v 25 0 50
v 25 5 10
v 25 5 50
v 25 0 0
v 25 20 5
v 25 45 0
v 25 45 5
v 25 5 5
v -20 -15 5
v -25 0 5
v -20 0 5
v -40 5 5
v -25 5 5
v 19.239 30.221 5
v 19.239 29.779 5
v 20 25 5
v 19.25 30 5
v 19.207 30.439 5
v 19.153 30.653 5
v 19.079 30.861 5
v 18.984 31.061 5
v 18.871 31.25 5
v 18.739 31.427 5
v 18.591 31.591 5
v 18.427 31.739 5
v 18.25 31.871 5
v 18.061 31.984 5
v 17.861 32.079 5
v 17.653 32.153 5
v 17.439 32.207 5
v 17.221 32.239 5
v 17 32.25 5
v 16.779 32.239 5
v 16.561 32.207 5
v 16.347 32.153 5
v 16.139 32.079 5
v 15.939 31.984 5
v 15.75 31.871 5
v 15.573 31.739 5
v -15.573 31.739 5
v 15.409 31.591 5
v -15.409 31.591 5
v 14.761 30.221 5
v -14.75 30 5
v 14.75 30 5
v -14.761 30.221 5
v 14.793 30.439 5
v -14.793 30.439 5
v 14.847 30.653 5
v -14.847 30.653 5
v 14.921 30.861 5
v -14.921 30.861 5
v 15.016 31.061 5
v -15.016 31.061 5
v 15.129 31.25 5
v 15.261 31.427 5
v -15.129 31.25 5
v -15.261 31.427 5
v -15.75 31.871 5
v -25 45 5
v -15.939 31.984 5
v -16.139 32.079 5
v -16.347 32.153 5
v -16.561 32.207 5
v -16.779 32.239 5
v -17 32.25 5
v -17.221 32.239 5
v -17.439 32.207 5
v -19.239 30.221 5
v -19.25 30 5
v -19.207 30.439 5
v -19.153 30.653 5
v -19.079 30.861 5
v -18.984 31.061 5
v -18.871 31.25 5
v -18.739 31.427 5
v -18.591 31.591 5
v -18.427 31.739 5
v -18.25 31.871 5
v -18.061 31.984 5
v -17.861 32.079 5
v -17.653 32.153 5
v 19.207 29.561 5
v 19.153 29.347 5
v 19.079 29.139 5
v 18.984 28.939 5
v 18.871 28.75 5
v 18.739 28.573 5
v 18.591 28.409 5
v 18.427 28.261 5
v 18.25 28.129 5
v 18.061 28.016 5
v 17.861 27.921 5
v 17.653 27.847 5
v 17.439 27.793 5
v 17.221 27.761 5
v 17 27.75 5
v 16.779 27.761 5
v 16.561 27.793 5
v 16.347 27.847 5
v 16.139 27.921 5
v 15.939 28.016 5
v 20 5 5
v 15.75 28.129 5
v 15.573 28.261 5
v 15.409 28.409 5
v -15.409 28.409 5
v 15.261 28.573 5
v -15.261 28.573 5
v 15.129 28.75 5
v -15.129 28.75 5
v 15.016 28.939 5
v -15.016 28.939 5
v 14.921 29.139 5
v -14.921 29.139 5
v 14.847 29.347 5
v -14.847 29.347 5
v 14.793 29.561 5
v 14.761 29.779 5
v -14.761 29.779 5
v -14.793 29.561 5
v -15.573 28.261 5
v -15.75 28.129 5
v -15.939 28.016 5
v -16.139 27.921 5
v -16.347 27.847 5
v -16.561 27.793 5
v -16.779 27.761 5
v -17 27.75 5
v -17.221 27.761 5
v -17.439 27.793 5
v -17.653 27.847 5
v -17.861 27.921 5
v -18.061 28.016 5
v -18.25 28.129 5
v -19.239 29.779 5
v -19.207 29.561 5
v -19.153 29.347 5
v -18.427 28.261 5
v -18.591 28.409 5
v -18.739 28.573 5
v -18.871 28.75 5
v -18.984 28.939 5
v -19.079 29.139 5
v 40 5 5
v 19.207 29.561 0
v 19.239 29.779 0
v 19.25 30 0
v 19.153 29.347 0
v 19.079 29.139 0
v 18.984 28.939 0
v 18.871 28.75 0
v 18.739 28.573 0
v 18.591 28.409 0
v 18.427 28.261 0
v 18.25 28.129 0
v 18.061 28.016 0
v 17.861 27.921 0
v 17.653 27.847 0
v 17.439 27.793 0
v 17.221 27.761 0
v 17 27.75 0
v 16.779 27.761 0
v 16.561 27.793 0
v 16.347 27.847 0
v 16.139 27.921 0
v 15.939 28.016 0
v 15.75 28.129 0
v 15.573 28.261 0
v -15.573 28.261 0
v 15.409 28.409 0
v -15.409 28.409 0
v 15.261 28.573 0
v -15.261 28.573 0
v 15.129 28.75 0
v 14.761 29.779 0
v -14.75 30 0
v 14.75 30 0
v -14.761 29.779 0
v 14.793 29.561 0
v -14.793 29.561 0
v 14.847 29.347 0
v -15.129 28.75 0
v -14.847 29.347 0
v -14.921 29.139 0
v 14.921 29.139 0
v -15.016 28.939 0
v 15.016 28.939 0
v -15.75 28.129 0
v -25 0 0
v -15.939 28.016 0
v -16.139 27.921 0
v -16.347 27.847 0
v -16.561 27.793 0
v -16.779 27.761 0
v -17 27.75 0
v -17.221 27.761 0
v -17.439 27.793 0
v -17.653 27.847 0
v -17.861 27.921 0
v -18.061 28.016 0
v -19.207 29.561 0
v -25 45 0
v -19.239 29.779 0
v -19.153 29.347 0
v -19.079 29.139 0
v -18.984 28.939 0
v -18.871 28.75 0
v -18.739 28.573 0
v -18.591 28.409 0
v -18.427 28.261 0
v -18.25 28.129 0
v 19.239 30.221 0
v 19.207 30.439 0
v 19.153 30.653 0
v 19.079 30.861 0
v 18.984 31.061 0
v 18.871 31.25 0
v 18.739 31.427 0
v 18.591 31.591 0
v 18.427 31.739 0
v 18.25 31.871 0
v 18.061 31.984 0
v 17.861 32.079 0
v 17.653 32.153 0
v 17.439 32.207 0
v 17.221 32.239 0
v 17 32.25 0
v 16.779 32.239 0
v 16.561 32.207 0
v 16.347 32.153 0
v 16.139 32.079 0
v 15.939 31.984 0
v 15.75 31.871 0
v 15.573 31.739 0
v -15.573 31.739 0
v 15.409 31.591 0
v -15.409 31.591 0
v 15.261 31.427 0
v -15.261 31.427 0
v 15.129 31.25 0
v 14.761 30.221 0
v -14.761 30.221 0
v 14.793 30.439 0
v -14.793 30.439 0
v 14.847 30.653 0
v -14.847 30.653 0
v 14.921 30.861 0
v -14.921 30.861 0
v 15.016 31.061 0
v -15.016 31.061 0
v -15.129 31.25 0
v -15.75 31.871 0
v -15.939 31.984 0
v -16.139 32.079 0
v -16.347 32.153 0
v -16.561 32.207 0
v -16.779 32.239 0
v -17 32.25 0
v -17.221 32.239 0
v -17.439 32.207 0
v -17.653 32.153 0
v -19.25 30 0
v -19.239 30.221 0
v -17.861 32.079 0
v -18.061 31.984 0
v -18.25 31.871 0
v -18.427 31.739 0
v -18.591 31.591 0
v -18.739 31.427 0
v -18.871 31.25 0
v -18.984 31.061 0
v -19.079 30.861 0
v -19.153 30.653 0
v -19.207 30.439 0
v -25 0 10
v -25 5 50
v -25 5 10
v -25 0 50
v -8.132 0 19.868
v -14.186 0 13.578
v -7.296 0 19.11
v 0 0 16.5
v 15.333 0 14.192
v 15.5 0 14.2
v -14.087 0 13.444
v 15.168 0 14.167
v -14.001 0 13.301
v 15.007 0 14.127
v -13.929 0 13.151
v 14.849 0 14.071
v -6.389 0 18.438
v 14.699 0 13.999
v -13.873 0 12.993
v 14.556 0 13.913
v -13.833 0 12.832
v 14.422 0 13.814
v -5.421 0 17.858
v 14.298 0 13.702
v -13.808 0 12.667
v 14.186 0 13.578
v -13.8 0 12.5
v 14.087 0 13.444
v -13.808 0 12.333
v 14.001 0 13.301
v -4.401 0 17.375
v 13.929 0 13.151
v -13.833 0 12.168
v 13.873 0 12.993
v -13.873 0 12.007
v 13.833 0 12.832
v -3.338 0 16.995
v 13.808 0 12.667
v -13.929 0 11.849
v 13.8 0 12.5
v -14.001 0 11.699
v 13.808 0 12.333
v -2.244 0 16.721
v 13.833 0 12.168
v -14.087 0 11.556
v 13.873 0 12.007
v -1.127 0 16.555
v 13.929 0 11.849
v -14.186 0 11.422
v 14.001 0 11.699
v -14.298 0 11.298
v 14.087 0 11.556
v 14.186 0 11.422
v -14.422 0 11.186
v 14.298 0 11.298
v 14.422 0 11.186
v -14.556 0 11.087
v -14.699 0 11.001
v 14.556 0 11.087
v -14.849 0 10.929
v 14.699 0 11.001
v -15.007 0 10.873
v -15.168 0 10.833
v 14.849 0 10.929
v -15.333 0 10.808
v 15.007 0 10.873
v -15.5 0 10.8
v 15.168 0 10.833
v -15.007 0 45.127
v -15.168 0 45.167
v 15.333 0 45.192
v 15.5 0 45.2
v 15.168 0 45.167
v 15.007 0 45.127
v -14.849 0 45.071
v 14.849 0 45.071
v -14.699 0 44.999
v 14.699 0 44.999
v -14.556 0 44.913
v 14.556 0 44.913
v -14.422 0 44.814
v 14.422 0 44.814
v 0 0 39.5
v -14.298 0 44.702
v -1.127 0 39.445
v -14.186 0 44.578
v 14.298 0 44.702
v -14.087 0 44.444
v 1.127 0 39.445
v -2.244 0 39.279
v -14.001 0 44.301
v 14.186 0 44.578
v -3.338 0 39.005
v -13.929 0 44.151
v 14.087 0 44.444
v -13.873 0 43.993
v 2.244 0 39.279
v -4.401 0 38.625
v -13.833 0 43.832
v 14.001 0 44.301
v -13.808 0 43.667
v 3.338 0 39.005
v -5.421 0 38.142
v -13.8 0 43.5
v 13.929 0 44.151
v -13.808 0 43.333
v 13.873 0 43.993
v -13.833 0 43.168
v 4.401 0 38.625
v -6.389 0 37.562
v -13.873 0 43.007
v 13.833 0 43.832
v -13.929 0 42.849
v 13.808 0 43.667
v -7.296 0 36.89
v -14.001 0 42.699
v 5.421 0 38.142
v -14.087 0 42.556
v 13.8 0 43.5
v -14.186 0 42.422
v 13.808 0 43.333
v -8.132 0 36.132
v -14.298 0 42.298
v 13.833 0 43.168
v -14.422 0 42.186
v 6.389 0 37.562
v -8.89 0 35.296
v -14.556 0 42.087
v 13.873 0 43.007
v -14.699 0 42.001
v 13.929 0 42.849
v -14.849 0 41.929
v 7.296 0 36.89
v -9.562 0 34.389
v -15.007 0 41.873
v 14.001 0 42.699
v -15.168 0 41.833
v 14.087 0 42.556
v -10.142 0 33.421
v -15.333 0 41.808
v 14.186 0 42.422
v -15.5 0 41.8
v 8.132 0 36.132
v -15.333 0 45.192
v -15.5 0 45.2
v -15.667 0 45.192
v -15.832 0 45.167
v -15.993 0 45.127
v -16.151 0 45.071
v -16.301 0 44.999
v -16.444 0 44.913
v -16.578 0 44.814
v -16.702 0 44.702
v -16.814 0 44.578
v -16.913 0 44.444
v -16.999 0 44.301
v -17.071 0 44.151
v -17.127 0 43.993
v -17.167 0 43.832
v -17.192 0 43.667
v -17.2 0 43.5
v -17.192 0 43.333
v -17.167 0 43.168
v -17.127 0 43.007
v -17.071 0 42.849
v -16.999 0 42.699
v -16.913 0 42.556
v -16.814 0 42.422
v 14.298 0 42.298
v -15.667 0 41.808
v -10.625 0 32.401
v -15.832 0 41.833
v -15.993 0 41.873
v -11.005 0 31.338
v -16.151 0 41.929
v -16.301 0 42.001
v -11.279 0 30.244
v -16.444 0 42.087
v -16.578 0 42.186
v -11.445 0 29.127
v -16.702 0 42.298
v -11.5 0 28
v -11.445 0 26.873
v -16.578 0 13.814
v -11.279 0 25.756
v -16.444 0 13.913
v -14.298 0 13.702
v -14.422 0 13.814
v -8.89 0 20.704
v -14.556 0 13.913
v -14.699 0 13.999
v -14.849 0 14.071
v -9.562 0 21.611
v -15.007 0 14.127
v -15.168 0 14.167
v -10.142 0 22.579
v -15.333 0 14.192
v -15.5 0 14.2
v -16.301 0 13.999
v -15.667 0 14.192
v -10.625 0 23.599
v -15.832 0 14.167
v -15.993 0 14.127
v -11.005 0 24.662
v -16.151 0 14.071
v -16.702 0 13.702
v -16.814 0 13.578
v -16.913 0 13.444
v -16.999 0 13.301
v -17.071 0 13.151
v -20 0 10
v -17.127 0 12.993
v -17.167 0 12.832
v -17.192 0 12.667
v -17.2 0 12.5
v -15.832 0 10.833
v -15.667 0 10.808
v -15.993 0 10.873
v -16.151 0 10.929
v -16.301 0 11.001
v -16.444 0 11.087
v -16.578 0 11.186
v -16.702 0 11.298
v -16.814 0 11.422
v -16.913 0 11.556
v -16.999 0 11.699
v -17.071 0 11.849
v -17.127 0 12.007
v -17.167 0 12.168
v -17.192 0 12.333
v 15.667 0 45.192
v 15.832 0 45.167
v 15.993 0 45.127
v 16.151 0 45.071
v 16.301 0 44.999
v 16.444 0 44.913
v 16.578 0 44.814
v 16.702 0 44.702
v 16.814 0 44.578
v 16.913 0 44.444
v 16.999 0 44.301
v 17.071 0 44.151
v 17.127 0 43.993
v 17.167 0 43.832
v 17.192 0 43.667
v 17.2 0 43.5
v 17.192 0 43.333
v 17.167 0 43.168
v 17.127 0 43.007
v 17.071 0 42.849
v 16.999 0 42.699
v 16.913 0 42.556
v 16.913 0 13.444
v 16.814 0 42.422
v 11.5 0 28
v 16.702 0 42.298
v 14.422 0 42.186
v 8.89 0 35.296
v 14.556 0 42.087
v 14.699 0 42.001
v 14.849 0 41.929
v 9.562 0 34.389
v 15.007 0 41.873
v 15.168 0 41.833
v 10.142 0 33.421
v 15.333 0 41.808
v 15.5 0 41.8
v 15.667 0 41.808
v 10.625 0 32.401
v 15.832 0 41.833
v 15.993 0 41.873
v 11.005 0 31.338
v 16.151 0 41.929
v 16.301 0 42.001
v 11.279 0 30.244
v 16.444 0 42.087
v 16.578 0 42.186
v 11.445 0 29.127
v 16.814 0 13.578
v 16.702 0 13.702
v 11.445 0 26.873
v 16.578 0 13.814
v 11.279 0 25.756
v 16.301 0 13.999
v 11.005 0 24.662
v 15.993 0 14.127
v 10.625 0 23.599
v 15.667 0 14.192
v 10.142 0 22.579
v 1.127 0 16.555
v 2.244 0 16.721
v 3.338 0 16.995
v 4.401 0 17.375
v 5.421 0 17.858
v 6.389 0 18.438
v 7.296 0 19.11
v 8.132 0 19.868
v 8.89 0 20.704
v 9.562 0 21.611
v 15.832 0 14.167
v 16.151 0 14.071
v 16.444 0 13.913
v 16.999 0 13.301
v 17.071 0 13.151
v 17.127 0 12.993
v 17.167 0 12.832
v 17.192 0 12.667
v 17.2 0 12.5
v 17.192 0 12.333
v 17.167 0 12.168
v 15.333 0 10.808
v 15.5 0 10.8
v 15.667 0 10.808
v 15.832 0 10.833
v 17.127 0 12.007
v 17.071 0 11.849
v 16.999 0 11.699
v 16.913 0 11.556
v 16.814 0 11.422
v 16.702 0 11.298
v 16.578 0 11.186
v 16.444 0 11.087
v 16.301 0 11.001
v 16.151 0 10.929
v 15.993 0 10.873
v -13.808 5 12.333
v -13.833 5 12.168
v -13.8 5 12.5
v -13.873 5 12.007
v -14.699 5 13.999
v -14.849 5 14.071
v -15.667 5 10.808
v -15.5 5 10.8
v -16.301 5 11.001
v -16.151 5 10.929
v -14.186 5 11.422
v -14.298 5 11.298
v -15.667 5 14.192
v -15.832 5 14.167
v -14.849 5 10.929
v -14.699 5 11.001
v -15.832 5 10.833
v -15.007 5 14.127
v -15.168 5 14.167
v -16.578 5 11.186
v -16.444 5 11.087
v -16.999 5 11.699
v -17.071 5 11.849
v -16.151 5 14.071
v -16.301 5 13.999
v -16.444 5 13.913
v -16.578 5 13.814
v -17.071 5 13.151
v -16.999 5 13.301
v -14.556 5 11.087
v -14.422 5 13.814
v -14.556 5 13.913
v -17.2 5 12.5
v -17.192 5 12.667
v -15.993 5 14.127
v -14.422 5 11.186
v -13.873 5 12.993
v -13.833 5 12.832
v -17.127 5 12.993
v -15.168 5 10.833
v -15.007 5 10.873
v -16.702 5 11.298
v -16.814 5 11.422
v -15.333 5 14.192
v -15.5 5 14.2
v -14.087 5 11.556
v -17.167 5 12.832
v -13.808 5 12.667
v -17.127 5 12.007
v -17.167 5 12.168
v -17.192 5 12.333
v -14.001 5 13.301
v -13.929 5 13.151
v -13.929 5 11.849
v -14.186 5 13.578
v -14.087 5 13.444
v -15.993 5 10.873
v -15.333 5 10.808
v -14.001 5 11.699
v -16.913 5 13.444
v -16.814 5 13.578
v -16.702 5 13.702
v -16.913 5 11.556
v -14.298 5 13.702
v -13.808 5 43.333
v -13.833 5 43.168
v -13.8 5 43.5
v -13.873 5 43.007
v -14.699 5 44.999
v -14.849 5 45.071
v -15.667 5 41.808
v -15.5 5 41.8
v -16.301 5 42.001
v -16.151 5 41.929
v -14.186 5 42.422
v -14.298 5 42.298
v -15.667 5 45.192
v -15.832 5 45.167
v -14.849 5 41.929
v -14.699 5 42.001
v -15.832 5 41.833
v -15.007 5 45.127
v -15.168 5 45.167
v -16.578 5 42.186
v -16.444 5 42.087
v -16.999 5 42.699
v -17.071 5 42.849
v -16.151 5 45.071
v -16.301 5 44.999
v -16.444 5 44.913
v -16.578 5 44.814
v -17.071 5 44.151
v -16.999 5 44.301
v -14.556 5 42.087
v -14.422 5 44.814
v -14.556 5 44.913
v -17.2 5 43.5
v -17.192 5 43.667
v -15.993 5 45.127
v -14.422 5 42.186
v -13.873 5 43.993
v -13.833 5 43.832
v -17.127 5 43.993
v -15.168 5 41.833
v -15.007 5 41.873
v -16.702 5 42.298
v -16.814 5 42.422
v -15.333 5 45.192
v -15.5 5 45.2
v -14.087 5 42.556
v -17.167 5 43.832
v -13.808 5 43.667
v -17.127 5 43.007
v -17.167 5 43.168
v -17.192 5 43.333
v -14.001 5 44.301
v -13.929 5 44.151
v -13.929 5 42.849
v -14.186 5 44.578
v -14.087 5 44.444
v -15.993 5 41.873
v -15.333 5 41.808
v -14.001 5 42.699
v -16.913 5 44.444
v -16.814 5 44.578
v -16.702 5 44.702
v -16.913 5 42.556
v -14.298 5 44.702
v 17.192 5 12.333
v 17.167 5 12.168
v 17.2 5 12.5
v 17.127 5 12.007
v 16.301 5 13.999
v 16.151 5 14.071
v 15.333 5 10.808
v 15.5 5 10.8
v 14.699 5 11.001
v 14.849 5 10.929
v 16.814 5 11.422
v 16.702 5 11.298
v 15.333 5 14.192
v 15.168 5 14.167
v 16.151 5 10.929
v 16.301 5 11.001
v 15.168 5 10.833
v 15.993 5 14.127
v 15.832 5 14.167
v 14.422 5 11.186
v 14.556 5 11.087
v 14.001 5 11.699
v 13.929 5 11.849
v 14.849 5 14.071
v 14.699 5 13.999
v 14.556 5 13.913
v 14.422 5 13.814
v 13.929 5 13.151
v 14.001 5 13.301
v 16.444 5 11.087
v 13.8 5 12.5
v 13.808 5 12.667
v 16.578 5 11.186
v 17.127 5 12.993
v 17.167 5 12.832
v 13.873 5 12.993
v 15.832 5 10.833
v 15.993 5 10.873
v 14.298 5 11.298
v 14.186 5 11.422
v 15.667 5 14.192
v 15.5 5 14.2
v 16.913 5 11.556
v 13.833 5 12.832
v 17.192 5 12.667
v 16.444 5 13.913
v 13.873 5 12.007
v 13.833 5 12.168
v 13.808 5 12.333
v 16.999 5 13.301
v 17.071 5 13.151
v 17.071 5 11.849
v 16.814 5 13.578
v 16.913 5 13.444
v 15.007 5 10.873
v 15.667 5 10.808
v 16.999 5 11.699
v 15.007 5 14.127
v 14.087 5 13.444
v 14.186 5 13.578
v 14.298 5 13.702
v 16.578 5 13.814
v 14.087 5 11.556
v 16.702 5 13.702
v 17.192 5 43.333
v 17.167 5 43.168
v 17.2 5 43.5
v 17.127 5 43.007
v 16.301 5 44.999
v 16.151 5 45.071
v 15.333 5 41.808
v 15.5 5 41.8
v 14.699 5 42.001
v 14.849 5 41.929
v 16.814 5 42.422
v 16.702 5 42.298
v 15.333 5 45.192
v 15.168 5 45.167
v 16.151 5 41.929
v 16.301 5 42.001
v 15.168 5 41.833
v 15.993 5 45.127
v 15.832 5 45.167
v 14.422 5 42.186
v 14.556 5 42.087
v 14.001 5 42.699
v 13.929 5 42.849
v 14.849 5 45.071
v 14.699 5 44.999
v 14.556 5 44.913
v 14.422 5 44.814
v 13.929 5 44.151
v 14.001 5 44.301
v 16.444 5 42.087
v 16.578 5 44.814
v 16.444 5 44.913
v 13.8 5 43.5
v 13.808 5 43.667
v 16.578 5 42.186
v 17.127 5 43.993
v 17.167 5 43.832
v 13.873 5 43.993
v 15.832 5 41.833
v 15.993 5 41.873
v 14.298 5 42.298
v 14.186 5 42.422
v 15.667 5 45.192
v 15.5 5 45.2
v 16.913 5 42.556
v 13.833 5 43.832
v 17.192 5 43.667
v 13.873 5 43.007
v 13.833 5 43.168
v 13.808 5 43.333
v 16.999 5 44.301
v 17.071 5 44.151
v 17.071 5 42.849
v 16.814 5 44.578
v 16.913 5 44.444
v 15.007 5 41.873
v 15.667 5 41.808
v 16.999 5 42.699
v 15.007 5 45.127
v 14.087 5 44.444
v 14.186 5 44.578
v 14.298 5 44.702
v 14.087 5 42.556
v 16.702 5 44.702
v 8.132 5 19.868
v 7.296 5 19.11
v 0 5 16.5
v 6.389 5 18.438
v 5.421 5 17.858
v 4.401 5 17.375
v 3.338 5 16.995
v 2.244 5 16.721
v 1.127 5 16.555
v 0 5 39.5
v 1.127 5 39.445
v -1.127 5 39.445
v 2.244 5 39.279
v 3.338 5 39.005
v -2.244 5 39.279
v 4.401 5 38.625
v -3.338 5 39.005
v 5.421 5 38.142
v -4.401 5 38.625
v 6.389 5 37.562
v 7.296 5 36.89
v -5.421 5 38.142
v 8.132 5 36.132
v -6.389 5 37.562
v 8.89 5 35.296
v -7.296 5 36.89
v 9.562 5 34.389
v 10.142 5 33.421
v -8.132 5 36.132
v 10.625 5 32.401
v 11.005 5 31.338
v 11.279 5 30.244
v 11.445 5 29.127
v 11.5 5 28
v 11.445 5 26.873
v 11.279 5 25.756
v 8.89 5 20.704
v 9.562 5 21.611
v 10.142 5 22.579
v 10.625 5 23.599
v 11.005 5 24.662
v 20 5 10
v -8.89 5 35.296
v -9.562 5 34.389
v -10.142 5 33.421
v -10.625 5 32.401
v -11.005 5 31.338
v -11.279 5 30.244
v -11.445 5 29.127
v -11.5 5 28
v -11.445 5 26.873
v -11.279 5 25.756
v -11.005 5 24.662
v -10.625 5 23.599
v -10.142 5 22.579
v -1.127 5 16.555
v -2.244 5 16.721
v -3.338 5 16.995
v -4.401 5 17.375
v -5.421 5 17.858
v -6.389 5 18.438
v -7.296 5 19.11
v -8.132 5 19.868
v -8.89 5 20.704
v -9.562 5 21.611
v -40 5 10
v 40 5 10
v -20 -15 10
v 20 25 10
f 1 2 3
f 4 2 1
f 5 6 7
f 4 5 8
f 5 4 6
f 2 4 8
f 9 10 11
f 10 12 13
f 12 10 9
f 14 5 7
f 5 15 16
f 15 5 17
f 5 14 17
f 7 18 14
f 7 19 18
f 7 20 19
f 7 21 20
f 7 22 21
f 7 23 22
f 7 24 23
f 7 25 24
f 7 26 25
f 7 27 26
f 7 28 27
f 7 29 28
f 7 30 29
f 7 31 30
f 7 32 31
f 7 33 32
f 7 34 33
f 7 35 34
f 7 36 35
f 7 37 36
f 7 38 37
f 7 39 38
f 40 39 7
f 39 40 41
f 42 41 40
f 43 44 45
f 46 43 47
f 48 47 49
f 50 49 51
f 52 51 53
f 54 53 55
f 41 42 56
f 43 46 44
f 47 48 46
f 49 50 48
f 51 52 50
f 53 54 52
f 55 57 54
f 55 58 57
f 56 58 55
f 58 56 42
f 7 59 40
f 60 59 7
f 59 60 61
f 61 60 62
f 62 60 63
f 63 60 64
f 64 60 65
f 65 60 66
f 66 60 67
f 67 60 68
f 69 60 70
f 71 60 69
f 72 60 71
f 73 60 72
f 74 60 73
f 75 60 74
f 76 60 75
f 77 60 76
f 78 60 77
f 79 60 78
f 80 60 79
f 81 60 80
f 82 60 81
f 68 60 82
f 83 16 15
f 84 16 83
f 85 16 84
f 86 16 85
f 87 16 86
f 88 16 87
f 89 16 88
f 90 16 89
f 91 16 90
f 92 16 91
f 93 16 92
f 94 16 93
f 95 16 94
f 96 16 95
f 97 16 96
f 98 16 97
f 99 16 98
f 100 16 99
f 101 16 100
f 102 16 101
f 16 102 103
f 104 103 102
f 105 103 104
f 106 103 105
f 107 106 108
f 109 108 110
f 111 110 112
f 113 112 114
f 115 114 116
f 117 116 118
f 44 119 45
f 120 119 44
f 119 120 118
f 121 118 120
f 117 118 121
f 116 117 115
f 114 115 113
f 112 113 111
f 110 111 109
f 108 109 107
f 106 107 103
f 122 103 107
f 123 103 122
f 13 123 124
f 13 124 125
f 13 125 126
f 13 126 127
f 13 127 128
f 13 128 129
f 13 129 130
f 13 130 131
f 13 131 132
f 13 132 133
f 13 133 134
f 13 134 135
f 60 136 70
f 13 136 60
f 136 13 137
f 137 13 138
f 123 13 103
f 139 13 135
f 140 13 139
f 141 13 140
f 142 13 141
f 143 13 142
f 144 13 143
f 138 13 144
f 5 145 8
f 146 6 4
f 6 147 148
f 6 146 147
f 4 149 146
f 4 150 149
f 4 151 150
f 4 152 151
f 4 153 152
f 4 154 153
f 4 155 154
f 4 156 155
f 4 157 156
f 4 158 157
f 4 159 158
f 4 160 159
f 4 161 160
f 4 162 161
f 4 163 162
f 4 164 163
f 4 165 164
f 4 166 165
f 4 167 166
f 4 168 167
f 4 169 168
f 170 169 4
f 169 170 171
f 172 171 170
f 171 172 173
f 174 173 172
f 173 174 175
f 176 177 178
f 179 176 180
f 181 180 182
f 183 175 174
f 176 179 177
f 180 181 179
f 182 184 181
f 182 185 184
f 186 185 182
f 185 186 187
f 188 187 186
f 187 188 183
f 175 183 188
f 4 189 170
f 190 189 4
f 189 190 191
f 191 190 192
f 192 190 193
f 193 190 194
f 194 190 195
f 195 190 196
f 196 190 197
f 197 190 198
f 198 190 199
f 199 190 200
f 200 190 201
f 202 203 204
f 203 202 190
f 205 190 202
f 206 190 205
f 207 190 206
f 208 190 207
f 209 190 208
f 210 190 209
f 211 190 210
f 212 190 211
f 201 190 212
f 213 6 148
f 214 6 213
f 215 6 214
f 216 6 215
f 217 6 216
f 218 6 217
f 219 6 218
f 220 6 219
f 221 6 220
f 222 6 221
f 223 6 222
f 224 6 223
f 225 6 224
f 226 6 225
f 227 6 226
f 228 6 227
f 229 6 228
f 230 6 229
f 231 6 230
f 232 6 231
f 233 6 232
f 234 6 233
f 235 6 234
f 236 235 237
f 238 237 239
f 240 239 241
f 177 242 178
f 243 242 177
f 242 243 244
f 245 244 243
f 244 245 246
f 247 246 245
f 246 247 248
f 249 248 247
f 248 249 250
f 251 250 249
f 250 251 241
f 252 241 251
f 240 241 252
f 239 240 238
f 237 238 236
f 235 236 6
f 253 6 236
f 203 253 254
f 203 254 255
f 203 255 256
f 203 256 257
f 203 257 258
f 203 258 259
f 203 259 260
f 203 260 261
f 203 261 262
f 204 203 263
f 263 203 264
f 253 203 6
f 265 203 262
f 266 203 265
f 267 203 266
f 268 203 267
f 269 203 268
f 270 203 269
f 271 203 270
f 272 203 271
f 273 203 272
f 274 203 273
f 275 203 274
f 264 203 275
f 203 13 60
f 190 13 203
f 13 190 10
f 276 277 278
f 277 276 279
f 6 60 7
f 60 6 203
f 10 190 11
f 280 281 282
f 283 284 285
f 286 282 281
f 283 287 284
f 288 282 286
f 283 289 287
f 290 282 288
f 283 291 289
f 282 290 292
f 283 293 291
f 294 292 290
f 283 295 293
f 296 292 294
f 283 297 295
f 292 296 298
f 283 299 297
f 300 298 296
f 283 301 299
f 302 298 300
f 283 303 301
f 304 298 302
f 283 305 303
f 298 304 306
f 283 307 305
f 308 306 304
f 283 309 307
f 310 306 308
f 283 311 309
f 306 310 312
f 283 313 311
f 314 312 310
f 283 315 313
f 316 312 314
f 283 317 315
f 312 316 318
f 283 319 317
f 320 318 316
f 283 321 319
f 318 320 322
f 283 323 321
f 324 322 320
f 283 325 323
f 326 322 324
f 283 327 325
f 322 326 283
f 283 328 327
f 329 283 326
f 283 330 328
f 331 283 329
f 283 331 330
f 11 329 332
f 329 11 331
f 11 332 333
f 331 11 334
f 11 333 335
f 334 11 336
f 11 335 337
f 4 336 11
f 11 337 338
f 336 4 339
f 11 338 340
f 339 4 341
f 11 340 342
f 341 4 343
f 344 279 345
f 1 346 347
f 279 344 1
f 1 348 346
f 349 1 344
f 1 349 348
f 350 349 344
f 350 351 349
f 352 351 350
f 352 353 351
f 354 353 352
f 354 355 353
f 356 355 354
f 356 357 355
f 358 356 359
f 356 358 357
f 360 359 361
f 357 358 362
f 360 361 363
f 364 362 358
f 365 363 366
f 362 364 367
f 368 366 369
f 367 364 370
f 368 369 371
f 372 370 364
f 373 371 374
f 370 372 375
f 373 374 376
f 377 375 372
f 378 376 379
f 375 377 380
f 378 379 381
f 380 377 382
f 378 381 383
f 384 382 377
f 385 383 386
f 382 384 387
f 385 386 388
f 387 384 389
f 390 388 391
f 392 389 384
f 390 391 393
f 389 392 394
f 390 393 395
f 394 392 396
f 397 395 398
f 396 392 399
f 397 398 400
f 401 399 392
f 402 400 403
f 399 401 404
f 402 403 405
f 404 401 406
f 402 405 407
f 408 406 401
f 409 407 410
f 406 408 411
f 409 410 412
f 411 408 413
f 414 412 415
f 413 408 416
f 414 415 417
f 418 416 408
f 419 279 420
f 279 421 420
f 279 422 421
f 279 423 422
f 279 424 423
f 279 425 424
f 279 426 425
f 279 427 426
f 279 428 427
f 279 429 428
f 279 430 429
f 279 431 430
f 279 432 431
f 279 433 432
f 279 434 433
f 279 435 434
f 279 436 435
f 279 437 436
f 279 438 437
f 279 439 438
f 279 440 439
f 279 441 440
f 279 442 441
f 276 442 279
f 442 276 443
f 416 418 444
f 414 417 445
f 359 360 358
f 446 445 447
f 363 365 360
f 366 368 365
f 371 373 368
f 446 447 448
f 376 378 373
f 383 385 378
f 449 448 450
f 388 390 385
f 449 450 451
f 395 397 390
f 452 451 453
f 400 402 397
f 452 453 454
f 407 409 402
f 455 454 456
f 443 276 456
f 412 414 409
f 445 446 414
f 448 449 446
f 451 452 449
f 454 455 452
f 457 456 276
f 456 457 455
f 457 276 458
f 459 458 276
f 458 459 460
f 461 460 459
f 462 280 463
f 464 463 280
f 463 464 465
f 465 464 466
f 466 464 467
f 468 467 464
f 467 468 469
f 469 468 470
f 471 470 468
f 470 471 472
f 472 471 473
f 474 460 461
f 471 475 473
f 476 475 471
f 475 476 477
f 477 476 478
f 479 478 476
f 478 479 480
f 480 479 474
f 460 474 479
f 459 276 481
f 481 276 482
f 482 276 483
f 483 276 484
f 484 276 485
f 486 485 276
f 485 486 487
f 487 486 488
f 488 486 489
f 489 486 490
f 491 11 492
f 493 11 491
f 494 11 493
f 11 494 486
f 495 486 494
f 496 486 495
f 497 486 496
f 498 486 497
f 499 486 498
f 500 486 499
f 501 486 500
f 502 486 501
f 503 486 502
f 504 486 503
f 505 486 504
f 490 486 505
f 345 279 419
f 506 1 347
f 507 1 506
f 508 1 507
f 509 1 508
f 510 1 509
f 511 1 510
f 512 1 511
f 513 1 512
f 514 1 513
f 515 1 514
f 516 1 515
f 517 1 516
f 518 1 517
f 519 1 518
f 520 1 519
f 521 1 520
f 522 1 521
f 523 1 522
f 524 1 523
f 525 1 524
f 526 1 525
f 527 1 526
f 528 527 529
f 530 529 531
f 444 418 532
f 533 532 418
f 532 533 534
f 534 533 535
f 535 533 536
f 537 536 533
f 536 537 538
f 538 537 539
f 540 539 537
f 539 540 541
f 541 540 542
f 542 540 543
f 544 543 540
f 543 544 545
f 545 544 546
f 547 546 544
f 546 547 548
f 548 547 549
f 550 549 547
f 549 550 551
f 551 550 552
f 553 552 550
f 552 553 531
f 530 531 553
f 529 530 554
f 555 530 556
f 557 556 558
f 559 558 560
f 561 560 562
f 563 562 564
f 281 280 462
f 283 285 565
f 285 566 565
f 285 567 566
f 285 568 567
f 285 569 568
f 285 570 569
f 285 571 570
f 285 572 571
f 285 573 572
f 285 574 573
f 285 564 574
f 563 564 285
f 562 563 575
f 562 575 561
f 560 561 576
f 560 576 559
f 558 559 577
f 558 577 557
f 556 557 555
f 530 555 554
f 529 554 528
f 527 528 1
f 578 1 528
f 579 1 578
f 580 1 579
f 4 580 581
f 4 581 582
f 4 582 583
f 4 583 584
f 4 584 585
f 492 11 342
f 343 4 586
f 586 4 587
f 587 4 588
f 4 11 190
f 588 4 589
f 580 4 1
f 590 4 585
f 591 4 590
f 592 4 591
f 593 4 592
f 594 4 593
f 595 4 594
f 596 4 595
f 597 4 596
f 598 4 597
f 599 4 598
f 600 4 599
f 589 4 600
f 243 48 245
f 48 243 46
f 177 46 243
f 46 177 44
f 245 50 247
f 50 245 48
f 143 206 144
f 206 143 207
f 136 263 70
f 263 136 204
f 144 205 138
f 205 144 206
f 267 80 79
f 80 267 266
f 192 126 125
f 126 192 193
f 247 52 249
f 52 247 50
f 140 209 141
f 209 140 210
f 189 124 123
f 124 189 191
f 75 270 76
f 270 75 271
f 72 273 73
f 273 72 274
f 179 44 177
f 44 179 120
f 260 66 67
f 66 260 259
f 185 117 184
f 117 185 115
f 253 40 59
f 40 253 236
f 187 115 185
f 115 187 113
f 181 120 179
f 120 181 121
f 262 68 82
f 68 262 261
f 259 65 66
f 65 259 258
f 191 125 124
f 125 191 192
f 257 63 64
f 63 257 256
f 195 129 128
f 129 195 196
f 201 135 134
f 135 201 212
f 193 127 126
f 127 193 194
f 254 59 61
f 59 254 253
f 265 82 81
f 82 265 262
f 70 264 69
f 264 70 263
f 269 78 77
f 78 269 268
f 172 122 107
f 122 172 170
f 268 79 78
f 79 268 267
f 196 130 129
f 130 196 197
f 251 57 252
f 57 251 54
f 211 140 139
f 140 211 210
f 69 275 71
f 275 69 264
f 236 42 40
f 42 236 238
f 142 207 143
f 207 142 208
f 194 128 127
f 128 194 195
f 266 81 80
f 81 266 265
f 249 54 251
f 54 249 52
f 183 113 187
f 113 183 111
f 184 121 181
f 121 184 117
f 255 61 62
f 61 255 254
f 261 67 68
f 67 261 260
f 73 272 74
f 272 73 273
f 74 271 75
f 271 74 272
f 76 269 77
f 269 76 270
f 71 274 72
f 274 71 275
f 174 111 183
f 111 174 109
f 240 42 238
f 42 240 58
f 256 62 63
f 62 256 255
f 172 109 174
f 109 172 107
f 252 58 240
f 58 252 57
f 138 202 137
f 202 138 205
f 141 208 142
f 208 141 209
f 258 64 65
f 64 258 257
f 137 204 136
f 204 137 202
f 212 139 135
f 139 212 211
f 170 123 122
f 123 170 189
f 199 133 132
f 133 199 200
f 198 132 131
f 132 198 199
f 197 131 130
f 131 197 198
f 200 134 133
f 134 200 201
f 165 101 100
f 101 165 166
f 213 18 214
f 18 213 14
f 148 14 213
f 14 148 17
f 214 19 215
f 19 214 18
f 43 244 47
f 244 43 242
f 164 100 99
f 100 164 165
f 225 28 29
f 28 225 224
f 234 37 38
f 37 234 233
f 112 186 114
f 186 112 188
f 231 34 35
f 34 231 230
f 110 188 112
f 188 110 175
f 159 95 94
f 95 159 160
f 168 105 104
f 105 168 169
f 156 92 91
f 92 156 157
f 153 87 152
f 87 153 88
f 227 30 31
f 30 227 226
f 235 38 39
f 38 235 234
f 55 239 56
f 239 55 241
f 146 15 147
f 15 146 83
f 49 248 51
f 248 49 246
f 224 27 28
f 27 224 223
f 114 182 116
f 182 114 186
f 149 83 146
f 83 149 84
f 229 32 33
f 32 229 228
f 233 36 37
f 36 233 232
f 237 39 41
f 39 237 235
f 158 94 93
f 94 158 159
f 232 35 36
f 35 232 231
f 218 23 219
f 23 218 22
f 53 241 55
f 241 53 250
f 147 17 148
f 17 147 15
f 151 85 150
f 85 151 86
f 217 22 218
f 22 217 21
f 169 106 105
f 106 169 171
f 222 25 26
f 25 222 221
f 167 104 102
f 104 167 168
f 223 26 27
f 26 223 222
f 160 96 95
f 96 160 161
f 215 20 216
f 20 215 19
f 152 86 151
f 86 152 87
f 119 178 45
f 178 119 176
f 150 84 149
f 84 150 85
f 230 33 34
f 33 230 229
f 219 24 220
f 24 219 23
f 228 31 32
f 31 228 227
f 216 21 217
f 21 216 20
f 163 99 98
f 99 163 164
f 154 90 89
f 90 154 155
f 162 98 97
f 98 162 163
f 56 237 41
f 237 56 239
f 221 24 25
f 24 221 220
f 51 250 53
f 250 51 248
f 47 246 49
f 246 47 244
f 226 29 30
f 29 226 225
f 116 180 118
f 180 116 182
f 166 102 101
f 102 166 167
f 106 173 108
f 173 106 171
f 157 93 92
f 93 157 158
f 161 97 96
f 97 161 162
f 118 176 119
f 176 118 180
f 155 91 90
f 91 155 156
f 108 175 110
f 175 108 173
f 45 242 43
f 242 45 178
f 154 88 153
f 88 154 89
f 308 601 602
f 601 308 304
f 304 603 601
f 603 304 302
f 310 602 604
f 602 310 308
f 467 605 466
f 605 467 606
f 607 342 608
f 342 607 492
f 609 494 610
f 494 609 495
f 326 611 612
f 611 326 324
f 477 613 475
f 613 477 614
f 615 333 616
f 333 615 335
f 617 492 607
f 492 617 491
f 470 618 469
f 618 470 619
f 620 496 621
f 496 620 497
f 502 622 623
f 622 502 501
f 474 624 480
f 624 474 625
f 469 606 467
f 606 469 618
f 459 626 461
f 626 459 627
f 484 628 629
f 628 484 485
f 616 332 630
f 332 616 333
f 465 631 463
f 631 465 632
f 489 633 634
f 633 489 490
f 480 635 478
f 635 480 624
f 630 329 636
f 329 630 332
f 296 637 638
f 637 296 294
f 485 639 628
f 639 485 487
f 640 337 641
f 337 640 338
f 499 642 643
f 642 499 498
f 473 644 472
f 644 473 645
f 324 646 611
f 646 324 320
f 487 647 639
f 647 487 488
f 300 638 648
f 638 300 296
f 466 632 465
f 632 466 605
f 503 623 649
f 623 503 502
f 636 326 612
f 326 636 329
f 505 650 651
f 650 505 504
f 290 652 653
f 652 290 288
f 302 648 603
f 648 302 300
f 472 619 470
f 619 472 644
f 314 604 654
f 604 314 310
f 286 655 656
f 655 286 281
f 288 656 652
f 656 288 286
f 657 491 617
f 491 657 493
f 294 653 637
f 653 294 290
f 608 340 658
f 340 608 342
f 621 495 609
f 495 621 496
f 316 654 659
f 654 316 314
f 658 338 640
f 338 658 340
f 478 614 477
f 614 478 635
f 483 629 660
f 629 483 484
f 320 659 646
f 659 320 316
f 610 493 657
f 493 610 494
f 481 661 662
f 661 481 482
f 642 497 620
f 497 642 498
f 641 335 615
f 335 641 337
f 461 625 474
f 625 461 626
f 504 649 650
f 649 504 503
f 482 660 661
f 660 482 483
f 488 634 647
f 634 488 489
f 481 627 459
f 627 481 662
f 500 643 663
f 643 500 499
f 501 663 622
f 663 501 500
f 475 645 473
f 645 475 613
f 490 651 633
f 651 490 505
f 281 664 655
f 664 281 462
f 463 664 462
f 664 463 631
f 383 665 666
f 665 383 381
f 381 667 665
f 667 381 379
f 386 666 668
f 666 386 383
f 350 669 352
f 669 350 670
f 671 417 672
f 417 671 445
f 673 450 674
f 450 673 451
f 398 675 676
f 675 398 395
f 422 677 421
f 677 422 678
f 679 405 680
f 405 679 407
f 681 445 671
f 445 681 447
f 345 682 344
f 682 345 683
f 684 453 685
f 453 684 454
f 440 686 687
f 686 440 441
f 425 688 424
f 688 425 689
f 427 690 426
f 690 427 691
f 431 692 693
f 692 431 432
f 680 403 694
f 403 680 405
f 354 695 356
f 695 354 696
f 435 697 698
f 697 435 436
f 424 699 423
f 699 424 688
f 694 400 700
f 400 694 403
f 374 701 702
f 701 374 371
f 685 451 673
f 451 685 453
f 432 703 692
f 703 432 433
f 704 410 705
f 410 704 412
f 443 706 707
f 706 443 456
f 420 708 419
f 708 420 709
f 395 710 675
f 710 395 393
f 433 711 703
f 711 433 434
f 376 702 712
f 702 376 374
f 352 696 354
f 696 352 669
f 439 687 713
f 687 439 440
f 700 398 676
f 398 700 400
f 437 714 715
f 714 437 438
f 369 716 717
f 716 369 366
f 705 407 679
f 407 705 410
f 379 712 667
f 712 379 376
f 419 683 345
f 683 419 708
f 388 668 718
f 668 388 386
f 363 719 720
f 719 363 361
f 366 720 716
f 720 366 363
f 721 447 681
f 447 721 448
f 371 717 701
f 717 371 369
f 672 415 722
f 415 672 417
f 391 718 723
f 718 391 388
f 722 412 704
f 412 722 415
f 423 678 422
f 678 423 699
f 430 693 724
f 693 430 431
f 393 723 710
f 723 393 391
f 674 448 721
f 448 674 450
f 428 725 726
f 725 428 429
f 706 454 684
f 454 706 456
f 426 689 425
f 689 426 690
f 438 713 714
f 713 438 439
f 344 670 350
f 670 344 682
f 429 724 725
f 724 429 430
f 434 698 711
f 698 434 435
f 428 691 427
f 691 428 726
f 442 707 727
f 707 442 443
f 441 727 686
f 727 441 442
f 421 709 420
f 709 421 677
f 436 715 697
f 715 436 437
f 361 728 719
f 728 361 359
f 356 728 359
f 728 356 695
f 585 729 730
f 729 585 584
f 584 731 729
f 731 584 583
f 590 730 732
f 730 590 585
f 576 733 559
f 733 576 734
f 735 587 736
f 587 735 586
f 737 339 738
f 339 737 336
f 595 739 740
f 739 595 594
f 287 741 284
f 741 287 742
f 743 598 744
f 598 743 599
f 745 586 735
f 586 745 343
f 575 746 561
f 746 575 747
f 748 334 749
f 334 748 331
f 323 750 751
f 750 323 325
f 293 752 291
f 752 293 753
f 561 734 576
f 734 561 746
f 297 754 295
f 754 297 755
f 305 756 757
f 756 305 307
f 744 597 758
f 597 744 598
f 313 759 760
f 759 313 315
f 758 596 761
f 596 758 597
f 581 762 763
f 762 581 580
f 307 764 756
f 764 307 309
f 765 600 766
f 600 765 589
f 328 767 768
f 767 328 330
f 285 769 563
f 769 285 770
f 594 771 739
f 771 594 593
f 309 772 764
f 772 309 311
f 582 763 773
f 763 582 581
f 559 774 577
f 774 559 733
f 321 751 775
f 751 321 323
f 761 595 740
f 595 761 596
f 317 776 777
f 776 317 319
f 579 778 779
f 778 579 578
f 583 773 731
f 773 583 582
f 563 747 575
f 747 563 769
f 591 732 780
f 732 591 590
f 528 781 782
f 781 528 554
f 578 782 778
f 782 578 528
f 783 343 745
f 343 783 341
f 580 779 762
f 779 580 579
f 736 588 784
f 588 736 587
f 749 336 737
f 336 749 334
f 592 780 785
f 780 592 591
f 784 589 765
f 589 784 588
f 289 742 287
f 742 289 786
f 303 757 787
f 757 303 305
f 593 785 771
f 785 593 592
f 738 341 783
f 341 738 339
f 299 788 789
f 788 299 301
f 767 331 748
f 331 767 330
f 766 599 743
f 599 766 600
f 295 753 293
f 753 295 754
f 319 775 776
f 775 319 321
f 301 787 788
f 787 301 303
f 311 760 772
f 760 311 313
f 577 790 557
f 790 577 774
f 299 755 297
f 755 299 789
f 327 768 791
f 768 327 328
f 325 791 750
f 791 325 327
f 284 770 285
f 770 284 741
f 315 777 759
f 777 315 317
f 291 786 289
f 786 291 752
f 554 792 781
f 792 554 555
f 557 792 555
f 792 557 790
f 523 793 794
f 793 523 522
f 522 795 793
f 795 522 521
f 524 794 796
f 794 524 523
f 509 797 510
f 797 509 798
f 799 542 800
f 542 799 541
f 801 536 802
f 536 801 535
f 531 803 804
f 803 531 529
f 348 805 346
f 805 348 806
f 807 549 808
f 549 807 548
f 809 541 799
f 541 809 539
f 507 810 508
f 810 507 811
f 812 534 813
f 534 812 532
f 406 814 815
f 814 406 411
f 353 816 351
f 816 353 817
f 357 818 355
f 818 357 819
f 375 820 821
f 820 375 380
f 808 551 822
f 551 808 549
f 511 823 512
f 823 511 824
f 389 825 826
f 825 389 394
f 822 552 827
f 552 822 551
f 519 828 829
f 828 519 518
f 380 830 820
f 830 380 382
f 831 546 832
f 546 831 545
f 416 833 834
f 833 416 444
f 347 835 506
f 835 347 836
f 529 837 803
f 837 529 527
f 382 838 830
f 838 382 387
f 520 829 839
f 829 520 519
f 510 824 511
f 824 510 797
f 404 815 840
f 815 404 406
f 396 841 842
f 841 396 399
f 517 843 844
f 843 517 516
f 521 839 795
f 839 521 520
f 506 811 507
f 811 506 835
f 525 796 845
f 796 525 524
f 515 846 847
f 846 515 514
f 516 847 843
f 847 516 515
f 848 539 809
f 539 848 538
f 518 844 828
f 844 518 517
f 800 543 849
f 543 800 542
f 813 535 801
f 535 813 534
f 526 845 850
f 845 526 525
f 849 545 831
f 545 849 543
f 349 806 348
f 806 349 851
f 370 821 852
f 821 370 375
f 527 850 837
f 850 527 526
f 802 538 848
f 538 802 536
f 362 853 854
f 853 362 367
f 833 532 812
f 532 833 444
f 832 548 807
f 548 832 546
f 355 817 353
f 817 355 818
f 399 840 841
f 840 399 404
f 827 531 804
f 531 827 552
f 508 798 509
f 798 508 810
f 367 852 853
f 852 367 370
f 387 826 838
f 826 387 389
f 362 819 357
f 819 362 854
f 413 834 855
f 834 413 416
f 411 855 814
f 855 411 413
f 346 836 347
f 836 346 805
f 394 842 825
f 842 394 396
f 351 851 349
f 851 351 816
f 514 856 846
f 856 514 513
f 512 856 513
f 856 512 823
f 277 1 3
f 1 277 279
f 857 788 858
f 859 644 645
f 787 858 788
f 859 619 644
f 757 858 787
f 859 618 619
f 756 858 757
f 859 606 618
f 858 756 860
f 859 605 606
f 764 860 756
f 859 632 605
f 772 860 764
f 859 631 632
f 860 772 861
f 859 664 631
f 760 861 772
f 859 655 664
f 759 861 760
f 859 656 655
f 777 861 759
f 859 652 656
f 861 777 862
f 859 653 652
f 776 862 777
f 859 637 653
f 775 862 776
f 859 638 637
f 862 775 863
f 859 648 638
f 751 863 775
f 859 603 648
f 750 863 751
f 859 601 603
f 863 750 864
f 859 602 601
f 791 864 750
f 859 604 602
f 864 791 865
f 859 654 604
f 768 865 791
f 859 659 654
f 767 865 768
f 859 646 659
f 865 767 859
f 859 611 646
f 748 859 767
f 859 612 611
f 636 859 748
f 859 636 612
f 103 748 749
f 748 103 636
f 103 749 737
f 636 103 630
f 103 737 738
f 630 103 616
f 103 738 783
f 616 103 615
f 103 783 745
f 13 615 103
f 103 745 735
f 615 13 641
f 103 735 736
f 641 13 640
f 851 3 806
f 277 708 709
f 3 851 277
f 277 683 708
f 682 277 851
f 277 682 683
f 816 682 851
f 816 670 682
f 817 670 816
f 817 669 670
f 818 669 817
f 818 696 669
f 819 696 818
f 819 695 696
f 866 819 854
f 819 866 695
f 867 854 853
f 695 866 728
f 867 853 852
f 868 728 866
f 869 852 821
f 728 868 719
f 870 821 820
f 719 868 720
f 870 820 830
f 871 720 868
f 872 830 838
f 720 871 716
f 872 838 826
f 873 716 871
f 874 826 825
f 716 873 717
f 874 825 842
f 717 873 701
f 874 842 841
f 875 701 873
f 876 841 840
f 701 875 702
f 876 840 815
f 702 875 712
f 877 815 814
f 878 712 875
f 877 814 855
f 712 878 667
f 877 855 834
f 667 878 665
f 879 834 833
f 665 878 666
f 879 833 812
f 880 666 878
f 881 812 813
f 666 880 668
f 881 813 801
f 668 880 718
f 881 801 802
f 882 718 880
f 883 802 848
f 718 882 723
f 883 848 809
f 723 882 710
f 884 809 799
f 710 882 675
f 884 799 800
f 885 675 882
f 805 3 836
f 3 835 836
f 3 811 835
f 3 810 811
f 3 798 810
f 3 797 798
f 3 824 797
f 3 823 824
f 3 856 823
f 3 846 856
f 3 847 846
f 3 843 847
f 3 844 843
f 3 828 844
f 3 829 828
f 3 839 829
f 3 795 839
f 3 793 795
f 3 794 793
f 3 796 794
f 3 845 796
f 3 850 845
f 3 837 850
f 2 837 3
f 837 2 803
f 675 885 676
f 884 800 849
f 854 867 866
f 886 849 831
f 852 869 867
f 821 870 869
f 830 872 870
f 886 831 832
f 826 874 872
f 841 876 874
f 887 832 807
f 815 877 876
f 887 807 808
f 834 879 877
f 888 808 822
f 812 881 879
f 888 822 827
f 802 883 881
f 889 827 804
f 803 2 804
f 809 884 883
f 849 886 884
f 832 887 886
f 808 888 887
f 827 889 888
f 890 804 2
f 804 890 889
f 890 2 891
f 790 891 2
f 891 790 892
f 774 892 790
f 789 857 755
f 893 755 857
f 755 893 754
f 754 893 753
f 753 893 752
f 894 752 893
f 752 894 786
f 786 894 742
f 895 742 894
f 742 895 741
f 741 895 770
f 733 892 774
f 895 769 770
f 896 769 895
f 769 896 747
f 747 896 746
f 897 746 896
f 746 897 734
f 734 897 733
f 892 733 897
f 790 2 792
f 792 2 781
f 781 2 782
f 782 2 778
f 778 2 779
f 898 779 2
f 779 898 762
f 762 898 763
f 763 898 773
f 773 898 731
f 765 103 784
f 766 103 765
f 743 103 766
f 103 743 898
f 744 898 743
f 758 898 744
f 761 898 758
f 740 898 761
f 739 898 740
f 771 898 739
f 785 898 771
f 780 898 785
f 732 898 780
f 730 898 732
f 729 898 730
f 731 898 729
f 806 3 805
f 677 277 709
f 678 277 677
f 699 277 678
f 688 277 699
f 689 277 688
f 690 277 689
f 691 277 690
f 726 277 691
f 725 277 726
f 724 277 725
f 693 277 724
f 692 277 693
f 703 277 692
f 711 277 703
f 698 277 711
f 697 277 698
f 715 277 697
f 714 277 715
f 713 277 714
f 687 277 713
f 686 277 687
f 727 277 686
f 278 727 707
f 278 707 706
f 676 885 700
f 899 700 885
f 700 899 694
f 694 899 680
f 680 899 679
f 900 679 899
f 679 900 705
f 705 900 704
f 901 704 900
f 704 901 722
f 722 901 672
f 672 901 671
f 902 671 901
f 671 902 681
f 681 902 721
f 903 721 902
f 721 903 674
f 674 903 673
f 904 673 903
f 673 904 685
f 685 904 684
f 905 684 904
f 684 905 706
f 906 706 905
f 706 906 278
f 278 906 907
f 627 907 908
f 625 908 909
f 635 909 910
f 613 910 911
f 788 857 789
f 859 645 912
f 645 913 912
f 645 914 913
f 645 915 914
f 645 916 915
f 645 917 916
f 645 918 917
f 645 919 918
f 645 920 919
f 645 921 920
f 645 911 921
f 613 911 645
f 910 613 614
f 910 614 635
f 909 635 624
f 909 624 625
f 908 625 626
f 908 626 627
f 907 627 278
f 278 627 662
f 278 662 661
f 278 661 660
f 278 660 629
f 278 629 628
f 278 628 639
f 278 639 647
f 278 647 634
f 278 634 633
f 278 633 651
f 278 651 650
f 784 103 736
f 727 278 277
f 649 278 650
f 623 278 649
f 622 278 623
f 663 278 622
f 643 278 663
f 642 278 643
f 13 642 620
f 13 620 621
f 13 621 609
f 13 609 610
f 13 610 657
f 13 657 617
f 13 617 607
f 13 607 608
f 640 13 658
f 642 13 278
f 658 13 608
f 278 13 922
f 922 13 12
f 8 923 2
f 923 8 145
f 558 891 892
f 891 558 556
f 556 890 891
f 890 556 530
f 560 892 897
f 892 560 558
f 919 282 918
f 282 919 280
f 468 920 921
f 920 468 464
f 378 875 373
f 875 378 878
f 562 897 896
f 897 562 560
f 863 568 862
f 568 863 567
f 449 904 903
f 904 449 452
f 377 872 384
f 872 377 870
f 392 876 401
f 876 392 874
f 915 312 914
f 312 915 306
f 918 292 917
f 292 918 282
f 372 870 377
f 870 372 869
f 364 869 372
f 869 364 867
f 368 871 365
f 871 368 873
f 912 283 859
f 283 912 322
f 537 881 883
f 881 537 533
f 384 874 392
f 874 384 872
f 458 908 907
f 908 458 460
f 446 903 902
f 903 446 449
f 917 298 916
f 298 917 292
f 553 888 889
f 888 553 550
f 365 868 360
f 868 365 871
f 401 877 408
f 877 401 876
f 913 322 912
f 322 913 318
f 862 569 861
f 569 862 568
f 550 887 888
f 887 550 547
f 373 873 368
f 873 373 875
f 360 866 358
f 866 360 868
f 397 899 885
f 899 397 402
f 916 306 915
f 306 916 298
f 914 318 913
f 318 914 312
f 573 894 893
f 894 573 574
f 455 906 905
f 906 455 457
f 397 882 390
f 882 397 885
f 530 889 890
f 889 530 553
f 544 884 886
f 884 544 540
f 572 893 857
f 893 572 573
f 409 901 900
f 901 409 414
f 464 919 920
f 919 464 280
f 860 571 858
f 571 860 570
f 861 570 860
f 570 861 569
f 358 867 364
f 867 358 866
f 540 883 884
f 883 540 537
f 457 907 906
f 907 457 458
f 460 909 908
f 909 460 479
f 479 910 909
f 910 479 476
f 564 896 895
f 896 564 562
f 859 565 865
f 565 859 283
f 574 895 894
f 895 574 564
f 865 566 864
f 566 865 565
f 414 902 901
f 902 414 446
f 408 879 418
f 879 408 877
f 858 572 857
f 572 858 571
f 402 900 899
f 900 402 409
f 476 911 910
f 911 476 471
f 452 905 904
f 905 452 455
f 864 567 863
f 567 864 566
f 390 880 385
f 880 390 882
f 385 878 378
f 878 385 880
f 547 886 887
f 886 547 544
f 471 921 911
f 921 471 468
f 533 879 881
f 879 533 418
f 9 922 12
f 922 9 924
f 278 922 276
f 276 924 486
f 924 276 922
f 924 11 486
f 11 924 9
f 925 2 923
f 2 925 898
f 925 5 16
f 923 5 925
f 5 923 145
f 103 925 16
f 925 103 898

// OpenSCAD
// L-Shaped NEMA 17 Motor Bracket for Syringe Pump
// Print Orientation: Base plate on XY plane (Z=0)

// --- Dimensions ---
// Base Plate
base_width_x = 50;           // From -25 to 25
base_depth_y = 45;           // From 0 to 45
base_height_z = 5;           // Thickness of base
base_hole_dia = 4.5;         // M4 through-holes
base_hole_x1 = -17;          // X position of hole 1
base_hole_x2 = 17;           // X position of hole 2
base_hole_y = 30;            // Y position of holes

// Vertical Motor Plate
motor_plate_width_x = 50;    // From -25 to 25
motor_plate_depth_y = 5;     // Thickness of vertical plate
motor_plate_height_z = 50;   // Total height from Z=0
motor_boss_dia = 23;         // Centering boss hole diameter
motor_boss_x = 0;            // Center X
motor_boss_z = 28;           // Center Z
motor_screw_dia = 3.4;       // M3 screw holes
motor_screw_pattern = 31;    // Square pattern for M3 screws

// Gussets
gusset_thickness = 5;        // Thickness of gussets
gusset_leg_y = 20;           // Leg length along Y
gusset_leg_z = 20;           // Leg length along Z
gusset_x_outer = 25;         // Outer edge X
gusset_x_inner = 20;         // Inner edge X

// --- Constants ---
$fn = 64;
eps = 0.1; // Overlap for clean boolean operations

// --- Main Assembly ---

union() {
    // 1. Base Plate
    difference() {
        // Main body
        translate([-base_width_x/2, 0, 0])
            cube([base_width_x, base_depth_y, base_height_z]);
        
        // M4 Through-holes
        translate([base_hole_x1, base_hole_y, -eps])
            cylinder(h = base_height_z + 2*eps, d = base_hole_dia);
        translate([base_hole_x2, base_hole_y, -eps])
            cylinder(h = base_height_z + 2*eps, d = base_hole_dia);
    }

    // 2. Vertical Motor Plate
    difference() {
        // Main body (standing on the back edge Y=0 to Y=5)
        // Note: User specified Y from 0 to 5, Z from 0 to 50.
        // Since it stands on the back edge of the base, and base is Y 0 to 45,
        // the plate is at the "back" (Y=0).
        translate([-motor_plate_width_x/2, 0, 0])
            cube([motor_plate_width_x, motor_plate_depth_y, motor_plate_height_z]);
        
        // Motor Centering Boss Hole (cut along Y axis)
        translate([motor_boss_x, -eps, motor_boss_z])
            rotate([-90, 0, 0])
            cylinder(h = motor_plate_depth_y + 2*eps, d = motor_boss_dia);
        
        // M3 Screw Holes (4 holes in a 31mm square pattern)
        // Pattern is centered on the boss hole
        for (sx = [-1, 1], sz = [-1, 1]) {
            translate([motor_boss_x + sx * (motor_screw_pattern/2), -eps, motor_boss_z + sz * (motor_screw_pattern/2)])
                rotate([-90, 0, 0])
                cylinder(h = motor_plate_depth_y + 2*eps, d = motor_screw_dia);
        }
    }

    // 3. Gussets (Triangular supports)
    // Gusset 1: Left side (X = -25 to -20)
    // Gusset 2: Right side (X = 20 to 25)
    // Right angle corner at Y=5, Z=5 (where plates meet)
    // Legs are 20mm along +Y and +Z.
    // Since the vertical plate is at Y=0 to 5, the gusset starts at Y=5.
    // The base is Z=0 to 5, so the gusset starts at Z=5.
    
    for (side = [-1, 1]) {
        translate([side * 20, 5, 5])
        rotate([0, 0, side == 1 ? 0 : 180]) // Mirroring logic for left/right
        linear_extrude(height = gusset_thickness)
        polygon(points = [
            [0, 0],               // Corner (Y=5, Z=5)
            [gusset_leg_y, 0],    // End of Y leg
            [0, gusset_leg_z]     // End of Z leg
        ]);
    }
}

// Note on Gusset placement: 
// The user requested gussets flush with edges X=-25 to -20 and X=20 to 25.
// My code places them at X=20 to 25 (Right) and X=-25 to -20 (Left) 
// by using the side loop and translating to the edge.
